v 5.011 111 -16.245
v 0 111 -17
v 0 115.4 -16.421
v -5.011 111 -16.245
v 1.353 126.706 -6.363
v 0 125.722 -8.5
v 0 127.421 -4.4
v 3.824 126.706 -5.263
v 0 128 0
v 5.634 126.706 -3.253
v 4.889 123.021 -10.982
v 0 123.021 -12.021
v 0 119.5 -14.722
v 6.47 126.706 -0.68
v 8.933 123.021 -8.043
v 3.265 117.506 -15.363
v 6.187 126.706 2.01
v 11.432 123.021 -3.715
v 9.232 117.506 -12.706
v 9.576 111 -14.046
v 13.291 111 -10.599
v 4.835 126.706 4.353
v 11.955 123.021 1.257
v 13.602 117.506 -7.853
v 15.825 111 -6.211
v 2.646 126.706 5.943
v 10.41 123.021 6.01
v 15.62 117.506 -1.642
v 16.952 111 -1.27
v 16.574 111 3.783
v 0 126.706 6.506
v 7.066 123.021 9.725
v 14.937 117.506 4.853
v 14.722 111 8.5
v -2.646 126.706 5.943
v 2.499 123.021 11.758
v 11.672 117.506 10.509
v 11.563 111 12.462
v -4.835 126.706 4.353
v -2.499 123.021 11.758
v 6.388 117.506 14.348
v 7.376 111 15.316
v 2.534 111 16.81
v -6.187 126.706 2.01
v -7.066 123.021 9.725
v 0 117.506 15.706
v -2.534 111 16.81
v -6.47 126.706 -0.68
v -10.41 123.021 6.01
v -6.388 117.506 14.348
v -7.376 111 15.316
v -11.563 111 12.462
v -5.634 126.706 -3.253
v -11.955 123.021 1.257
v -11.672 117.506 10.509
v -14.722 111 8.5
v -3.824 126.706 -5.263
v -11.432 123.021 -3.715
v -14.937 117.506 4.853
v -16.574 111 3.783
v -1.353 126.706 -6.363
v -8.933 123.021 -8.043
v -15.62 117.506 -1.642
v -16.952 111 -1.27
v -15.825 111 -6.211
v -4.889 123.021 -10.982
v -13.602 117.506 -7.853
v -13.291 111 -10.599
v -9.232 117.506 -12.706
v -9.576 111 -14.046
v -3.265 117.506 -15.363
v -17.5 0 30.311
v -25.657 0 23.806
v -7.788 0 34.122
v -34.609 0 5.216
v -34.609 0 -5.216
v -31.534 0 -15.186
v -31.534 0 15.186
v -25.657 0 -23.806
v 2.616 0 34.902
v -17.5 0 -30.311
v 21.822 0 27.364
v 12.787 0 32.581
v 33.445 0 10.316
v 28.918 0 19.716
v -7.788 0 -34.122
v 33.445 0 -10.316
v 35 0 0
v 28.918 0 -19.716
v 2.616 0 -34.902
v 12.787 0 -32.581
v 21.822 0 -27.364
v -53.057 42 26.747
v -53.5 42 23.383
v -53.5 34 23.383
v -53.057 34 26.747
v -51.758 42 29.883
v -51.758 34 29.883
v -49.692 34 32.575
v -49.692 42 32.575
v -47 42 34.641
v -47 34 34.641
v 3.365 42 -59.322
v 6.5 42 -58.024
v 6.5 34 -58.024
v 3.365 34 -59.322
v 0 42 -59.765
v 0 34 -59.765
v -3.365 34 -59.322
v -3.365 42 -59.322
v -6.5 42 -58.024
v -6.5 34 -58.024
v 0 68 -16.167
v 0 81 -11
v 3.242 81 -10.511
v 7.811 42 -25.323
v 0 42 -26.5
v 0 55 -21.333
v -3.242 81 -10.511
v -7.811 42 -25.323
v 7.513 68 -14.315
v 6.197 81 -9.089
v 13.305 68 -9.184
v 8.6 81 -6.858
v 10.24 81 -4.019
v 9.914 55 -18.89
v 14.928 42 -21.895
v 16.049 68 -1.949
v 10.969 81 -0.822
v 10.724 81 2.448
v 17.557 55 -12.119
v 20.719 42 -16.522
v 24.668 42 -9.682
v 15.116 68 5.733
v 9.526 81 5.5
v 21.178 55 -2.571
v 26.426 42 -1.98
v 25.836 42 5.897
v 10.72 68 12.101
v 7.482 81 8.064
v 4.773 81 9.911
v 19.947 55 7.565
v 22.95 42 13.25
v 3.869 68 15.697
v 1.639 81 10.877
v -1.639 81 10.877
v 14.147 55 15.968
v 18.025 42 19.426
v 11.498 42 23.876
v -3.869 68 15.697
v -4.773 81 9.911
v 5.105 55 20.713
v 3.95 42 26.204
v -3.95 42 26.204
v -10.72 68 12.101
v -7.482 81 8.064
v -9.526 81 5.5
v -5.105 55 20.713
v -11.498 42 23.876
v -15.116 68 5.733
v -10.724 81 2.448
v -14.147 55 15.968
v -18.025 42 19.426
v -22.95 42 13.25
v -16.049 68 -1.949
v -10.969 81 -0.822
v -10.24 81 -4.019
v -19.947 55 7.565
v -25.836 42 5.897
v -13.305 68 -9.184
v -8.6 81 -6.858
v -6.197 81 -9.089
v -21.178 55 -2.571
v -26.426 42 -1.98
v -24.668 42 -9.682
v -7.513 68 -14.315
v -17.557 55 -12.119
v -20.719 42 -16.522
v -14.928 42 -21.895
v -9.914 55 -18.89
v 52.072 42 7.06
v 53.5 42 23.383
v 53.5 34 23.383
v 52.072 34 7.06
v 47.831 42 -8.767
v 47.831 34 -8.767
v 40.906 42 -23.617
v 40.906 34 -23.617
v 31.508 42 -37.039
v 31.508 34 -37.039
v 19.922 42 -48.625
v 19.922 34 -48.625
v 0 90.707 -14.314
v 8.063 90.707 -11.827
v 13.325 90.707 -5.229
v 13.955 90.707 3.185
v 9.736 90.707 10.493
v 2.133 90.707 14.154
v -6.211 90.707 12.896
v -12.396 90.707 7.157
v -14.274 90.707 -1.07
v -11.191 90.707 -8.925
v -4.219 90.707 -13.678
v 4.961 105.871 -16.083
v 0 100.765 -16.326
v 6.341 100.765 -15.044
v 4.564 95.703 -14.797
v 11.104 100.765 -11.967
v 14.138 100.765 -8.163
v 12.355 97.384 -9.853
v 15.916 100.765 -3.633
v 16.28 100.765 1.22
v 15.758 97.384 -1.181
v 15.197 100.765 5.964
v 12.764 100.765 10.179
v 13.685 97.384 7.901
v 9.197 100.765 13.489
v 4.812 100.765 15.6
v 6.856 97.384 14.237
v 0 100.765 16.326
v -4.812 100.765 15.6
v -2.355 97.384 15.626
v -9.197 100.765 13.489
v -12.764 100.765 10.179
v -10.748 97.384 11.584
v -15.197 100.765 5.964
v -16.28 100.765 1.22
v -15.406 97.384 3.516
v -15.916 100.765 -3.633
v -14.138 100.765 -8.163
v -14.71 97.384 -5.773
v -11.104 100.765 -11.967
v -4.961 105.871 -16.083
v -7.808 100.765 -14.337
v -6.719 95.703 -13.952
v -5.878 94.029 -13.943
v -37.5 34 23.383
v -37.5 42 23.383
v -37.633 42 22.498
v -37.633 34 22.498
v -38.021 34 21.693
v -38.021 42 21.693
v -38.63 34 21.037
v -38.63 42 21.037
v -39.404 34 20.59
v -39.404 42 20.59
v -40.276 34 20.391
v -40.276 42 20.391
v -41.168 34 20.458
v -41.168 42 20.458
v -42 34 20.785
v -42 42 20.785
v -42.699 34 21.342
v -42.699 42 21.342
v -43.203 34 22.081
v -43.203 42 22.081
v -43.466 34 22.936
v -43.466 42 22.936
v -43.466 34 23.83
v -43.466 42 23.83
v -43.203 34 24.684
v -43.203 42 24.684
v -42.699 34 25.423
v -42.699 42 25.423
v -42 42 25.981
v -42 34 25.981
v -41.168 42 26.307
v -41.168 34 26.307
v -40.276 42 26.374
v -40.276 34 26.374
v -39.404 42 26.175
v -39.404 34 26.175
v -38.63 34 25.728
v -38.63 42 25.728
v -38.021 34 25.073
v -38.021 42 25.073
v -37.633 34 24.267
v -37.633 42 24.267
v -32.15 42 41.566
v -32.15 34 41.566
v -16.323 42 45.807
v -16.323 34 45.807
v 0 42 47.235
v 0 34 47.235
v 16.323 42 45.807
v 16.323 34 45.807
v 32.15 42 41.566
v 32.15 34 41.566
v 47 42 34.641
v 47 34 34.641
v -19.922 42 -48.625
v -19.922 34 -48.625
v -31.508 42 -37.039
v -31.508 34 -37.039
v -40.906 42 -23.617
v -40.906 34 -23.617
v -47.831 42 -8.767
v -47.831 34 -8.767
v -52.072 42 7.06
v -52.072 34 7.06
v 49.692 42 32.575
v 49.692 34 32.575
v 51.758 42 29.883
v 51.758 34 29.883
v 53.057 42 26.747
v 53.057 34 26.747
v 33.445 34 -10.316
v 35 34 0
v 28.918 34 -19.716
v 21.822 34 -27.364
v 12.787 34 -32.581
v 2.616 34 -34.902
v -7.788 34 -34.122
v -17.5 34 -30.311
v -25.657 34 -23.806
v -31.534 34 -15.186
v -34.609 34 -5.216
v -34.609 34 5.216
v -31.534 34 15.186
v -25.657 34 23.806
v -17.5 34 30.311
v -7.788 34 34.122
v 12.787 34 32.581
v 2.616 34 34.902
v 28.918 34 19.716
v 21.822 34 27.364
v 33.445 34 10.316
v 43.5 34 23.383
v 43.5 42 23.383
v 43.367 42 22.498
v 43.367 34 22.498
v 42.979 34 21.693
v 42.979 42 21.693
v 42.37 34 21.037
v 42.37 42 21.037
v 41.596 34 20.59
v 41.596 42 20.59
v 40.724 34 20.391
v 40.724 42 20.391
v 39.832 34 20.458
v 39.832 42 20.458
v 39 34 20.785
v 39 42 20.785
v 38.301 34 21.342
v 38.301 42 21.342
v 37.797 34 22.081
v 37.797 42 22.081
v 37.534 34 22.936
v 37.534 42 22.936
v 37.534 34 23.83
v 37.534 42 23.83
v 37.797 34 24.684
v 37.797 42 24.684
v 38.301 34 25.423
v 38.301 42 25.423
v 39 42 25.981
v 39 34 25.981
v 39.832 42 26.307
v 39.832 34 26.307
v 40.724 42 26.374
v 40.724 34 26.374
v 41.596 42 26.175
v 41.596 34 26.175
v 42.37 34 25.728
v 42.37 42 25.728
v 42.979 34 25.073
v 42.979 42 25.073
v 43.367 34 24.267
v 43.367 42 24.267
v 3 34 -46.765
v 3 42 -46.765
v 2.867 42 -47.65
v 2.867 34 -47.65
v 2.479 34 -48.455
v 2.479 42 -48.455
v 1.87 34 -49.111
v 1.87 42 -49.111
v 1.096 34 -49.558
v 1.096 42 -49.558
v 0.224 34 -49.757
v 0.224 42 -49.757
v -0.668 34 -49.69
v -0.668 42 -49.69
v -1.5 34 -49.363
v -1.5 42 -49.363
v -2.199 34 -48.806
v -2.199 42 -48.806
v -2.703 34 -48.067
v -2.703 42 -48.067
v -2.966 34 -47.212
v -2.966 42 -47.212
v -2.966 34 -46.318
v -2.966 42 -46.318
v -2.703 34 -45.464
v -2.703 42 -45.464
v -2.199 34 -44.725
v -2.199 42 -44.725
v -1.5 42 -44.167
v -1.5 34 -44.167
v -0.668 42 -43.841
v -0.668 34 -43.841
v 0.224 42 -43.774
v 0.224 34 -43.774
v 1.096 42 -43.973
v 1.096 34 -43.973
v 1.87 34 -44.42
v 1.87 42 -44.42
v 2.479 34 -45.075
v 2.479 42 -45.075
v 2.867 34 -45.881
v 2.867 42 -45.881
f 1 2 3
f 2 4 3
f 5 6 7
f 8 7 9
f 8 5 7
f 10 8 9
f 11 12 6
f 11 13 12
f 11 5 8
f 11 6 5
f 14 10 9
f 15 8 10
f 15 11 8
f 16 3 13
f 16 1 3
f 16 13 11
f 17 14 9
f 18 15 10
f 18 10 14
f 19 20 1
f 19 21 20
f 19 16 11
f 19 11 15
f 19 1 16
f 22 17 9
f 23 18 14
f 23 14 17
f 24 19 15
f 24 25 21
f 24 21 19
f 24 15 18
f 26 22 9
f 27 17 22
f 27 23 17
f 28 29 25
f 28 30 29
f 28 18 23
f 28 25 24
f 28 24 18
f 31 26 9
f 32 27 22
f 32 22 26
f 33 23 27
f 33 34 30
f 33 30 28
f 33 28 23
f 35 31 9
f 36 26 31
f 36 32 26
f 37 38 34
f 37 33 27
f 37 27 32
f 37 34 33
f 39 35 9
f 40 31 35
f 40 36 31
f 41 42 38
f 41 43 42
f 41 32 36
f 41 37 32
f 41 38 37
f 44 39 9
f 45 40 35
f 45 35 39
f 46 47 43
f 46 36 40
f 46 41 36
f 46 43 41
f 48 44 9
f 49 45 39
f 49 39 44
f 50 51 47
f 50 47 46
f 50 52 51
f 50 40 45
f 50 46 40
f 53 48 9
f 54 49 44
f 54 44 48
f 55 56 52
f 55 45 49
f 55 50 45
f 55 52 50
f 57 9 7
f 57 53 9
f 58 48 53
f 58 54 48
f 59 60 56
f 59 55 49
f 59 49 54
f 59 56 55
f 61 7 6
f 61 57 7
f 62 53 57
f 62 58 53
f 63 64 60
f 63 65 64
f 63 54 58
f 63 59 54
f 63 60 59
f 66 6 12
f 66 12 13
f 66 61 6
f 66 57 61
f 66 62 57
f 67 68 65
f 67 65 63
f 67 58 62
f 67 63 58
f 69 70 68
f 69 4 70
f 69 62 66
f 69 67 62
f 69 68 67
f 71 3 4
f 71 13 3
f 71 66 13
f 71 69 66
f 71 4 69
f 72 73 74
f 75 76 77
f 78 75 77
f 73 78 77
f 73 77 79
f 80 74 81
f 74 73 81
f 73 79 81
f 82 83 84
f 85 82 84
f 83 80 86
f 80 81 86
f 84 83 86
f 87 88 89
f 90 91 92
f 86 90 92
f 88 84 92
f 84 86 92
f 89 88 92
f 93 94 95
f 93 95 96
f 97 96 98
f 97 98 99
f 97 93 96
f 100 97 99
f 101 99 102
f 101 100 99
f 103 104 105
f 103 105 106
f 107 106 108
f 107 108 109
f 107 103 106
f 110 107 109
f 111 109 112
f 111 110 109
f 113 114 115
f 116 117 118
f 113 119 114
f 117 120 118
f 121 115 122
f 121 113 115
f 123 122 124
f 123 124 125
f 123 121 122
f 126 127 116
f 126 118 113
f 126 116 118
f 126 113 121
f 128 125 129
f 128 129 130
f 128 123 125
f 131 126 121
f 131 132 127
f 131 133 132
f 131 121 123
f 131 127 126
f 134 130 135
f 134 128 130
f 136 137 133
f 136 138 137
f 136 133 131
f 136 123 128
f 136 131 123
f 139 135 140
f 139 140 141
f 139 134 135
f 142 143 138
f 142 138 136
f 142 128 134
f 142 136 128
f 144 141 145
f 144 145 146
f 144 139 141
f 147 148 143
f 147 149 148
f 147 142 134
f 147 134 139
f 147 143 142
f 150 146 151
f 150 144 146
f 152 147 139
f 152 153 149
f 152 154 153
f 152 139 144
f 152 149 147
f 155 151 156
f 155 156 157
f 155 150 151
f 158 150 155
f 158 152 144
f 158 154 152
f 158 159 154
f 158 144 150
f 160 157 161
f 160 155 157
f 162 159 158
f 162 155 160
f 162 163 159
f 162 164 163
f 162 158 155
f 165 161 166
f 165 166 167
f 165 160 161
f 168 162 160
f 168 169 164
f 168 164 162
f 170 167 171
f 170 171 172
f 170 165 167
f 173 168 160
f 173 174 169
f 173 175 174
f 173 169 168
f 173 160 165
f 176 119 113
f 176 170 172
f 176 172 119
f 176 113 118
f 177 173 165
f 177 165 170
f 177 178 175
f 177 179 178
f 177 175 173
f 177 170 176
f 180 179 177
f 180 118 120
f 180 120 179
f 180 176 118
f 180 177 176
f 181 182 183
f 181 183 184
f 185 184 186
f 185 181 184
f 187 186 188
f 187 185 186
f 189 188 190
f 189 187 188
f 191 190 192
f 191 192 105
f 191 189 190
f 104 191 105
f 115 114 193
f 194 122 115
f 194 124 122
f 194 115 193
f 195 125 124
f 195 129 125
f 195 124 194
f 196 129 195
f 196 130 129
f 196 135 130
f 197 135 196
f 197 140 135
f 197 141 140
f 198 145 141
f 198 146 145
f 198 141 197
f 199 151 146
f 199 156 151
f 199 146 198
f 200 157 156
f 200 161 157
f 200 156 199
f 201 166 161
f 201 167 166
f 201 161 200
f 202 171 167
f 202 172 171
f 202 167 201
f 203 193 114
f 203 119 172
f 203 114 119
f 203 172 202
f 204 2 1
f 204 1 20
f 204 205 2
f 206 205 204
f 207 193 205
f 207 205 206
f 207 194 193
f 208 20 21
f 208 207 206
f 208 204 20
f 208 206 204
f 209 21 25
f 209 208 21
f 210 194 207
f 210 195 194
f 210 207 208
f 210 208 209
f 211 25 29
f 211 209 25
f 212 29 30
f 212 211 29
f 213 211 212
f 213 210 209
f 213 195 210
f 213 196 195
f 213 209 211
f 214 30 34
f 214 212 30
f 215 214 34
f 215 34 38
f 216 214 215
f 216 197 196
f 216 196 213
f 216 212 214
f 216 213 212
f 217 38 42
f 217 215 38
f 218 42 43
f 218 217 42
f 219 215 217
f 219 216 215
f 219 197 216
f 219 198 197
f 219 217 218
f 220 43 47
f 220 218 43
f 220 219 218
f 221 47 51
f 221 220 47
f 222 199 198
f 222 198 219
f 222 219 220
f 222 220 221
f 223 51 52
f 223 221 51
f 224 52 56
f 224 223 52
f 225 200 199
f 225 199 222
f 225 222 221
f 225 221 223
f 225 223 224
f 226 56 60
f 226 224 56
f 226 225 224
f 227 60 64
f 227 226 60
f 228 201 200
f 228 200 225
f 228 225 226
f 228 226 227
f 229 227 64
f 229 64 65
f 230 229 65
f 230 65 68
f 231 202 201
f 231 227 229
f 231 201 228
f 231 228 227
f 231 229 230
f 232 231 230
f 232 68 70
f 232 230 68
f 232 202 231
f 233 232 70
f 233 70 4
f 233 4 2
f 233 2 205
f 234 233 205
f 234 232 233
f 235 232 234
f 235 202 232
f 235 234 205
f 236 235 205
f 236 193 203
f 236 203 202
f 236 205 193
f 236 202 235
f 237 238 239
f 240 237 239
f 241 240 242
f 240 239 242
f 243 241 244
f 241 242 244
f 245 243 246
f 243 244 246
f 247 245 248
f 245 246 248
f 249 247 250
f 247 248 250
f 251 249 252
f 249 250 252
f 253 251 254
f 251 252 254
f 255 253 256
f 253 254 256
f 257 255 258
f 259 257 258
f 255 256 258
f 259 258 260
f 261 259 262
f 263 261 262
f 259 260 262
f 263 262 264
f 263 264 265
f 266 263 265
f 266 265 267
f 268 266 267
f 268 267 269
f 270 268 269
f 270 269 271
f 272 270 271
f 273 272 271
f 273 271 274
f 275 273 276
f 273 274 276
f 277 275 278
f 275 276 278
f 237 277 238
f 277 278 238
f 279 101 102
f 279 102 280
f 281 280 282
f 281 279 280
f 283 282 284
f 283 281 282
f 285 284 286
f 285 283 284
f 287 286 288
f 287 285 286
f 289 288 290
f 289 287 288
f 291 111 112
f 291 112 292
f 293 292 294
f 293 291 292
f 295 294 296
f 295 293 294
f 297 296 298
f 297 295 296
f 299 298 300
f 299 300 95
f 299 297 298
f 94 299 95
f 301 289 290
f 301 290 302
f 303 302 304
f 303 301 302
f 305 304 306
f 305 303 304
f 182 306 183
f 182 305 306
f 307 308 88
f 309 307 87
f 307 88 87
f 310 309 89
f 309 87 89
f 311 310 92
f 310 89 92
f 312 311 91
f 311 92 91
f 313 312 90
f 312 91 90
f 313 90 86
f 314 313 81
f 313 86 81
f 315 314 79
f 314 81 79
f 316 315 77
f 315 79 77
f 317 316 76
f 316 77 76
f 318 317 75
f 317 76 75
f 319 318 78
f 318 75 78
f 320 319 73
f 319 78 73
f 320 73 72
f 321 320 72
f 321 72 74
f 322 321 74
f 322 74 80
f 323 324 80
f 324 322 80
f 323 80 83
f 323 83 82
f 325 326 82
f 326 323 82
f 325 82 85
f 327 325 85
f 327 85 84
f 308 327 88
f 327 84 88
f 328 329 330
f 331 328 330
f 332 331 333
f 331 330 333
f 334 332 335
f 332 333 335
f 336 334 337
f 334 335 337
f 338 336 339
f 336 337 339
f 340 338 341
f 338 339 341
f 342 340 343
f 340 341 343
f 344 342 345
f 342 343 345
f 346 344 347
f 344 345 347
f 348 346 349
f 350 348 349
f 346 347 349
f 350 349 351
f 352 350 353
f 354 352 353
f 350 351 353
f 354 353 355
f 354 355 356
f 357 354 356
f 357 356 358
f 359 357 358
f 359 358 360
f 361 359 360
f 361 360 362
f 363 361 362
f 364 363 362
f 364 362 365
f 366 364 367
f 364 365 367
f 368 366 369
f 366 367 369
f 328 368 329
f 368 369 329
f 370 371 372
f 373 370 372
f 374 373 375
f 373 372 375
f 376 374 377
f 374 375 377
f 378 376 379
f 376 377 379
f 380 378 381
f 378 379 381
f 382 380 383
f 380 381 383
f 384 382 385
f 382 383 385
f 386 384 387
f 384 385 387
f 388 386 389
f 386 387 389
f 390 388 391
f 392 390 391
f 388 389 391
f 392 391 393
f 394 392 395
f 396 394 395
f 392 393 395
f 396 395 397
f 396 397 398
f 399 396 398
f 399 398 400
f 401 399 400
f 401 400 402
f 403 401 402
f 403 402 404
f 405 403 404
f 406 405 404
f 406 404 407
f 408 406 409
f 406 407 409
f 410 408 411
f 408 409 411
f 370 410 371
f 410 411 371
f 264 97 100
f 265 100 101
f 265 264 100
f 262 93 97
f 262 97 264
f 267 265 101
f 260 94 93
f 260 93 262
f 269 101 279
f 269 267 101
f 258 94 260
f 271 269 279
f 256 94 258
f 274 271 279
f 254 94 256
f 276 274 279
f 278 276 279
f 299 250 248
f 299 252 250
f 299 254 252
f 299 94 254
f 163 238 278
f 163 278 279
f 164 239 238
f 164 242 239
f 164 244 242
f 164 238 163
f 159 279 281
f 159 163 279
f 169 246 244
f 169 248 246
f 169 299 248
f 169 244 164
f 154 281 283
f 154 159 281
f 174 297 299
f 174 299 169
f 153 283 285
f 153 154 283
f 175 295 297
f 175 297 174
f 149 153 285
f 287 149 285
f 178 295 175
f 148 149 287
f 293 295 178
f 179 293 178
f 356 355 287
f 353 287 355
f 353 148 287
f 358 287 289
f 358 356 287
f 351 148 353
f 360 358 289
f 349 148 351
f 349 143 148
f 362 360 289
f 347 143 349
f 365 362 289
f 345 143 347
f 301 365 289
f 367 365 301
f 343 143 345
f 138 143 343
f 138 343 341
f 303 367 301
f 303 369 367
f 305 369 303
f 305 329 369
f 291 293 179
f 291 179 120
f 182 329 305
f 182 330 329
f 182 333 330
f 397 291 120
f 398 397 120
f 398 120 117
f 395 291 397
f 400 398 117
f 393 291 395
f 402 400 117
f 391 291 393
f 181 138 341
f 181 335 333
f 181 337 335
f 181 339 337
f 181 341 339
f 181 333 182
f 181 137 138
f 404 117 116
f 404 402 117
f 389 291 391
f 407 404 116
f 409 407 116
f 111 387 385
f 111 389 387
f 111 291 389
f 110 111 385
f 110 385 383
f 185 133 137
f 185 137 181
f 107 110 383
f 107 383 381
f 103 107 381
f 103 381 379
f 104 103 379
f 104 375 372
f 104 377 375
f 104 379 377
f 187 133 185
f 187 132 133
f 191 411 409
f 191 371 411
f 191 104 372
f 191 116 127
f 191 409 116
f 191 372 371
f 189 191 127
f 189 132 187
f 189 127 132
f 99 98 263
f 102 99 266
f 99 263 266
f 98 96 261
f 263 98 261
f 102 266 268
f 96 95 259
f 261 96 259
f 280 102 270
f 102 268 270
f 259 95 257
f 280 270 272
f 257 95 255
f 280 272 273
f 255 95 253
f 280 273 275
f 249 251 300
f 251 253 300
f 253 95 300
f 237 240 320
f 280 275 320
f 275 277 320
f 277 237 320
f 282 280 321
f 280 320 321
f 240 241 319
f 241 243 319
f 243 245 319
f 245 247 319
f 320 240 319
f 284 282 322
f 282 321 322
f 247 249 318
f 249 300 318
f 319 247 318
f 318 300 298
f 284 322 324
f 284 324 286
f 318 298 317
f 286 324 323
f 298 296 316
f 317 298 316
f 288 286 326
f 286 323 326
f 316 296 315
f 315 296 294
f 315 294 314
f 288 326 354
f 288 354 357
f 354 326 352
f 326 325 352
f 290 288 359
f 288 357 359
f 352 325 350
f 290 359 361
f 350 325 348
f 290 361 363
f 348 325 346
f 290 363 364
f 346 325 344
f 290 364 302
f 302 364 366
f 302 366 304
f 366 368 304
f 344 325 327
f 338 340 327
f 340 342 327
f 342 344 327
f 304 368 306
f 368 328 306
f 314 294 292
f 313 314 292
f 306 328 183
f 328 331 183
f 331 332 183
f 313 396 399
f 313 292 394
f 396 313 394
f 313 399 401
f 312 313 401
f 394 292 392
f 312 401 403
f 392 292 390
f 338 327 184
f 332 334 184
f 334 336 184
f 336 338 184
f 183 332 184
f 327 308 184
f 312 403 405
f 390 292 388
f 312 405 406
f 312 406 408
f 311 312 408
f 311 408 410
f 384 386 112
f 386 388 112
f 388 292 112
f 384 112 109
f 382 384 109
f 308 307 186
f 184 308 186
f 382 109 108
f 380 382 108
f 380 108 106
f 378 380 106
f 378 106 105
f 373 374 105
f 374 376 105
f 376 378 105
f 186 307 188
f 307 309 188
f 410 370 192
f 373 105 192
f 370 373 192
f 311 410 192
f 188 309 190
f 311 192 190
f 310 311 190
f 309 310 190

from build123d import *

# Parameters (mm, degrees)
SKETCH_1_R      = 35
EXTRUDE_1_DEPTH = 42
SKETCH_2_R      = 3
EXTRUDE_2_DEPTH = 8


with BuildPart() as part:
    # Эскиз1 → Бобышка-Вытянуть1 (new body)
    with BuildSketch(Plane(origin=(0, 0, 0), x_dir=(1, 0, 0), z_dir=(0, 1, 0))):
        Circle(SKETCH_1_R)
    extrude(amount=EXTRUDE_1_DEPTH)

    # Эскиз2 → Бобышка-Вытянуть2 (add)
    with BuildSketch(Plane(origin=(0, 42, 0), x_dir=(1, 0, 0), z_dir=(0, 1, 0))):
        with BuildLine():
            ThreePointArc((-47, -34.641016151), (0, -47.234628196), (47, -34.641016151))
            ThreePointArc((47, -34.641016151), (51.758330249, -29.882685902), (53.5, -23.382685902))
            ThreePointArc((53.5, -23.382685902), (40.906387956, 23.617314098), (6.5, 58.023702054))
            ThreePointArc((6.5, 58.023702054), (0, 59.765371804), (-6.5, 58.023702054))
            ThreePointArc((-6.5, 58.023702054), (-40.906387956, 23.617314098), (-53.5, -23.382685902))
            ThreePointArc((-53.5, -23.382685902), (-51.758330249, -29.882685902), (-47, -34.641016151))
        make_face()
        with Locations((0, 46.765371804)):
            Circle(SKETCH_2_R, mode=Mode.SUBTRACT)
        with Locations((-40.5, -23.382685902)):
            Circle(SKETCH_2_R, mode=Mode.SUBTRACT)
        with Locations((40.5, -23.382685902)):
            Circle(SKETCH_2_R, mode=Mode.SUBTRACT)
    extrude(amount=-EXTRUDE_2_DEPTH)

    # Эскиз3 → Повернуть1 (revolve)
    with BuildSketch(Plane(origin=(0, 0, 0), x_dir=(0, 0, -1), z_dir=(1, 0, 0))):
        with BuildLine():
            Line((11, 81), (26.5, 42))
            Line((26.5, 42), (0, 42))
            Line((0, 42), (0, 128))
            ThreePointArc((0, 128), (12.02081528, 123.02081528), (17, 111))
            ThreePointArc((17, 111), (15.485292704, 95.702941459), (11, 81))
        make_face()
    revolve(axis=Axis((0, 128, 0), (0, -1, 0)))


solid = part.part
